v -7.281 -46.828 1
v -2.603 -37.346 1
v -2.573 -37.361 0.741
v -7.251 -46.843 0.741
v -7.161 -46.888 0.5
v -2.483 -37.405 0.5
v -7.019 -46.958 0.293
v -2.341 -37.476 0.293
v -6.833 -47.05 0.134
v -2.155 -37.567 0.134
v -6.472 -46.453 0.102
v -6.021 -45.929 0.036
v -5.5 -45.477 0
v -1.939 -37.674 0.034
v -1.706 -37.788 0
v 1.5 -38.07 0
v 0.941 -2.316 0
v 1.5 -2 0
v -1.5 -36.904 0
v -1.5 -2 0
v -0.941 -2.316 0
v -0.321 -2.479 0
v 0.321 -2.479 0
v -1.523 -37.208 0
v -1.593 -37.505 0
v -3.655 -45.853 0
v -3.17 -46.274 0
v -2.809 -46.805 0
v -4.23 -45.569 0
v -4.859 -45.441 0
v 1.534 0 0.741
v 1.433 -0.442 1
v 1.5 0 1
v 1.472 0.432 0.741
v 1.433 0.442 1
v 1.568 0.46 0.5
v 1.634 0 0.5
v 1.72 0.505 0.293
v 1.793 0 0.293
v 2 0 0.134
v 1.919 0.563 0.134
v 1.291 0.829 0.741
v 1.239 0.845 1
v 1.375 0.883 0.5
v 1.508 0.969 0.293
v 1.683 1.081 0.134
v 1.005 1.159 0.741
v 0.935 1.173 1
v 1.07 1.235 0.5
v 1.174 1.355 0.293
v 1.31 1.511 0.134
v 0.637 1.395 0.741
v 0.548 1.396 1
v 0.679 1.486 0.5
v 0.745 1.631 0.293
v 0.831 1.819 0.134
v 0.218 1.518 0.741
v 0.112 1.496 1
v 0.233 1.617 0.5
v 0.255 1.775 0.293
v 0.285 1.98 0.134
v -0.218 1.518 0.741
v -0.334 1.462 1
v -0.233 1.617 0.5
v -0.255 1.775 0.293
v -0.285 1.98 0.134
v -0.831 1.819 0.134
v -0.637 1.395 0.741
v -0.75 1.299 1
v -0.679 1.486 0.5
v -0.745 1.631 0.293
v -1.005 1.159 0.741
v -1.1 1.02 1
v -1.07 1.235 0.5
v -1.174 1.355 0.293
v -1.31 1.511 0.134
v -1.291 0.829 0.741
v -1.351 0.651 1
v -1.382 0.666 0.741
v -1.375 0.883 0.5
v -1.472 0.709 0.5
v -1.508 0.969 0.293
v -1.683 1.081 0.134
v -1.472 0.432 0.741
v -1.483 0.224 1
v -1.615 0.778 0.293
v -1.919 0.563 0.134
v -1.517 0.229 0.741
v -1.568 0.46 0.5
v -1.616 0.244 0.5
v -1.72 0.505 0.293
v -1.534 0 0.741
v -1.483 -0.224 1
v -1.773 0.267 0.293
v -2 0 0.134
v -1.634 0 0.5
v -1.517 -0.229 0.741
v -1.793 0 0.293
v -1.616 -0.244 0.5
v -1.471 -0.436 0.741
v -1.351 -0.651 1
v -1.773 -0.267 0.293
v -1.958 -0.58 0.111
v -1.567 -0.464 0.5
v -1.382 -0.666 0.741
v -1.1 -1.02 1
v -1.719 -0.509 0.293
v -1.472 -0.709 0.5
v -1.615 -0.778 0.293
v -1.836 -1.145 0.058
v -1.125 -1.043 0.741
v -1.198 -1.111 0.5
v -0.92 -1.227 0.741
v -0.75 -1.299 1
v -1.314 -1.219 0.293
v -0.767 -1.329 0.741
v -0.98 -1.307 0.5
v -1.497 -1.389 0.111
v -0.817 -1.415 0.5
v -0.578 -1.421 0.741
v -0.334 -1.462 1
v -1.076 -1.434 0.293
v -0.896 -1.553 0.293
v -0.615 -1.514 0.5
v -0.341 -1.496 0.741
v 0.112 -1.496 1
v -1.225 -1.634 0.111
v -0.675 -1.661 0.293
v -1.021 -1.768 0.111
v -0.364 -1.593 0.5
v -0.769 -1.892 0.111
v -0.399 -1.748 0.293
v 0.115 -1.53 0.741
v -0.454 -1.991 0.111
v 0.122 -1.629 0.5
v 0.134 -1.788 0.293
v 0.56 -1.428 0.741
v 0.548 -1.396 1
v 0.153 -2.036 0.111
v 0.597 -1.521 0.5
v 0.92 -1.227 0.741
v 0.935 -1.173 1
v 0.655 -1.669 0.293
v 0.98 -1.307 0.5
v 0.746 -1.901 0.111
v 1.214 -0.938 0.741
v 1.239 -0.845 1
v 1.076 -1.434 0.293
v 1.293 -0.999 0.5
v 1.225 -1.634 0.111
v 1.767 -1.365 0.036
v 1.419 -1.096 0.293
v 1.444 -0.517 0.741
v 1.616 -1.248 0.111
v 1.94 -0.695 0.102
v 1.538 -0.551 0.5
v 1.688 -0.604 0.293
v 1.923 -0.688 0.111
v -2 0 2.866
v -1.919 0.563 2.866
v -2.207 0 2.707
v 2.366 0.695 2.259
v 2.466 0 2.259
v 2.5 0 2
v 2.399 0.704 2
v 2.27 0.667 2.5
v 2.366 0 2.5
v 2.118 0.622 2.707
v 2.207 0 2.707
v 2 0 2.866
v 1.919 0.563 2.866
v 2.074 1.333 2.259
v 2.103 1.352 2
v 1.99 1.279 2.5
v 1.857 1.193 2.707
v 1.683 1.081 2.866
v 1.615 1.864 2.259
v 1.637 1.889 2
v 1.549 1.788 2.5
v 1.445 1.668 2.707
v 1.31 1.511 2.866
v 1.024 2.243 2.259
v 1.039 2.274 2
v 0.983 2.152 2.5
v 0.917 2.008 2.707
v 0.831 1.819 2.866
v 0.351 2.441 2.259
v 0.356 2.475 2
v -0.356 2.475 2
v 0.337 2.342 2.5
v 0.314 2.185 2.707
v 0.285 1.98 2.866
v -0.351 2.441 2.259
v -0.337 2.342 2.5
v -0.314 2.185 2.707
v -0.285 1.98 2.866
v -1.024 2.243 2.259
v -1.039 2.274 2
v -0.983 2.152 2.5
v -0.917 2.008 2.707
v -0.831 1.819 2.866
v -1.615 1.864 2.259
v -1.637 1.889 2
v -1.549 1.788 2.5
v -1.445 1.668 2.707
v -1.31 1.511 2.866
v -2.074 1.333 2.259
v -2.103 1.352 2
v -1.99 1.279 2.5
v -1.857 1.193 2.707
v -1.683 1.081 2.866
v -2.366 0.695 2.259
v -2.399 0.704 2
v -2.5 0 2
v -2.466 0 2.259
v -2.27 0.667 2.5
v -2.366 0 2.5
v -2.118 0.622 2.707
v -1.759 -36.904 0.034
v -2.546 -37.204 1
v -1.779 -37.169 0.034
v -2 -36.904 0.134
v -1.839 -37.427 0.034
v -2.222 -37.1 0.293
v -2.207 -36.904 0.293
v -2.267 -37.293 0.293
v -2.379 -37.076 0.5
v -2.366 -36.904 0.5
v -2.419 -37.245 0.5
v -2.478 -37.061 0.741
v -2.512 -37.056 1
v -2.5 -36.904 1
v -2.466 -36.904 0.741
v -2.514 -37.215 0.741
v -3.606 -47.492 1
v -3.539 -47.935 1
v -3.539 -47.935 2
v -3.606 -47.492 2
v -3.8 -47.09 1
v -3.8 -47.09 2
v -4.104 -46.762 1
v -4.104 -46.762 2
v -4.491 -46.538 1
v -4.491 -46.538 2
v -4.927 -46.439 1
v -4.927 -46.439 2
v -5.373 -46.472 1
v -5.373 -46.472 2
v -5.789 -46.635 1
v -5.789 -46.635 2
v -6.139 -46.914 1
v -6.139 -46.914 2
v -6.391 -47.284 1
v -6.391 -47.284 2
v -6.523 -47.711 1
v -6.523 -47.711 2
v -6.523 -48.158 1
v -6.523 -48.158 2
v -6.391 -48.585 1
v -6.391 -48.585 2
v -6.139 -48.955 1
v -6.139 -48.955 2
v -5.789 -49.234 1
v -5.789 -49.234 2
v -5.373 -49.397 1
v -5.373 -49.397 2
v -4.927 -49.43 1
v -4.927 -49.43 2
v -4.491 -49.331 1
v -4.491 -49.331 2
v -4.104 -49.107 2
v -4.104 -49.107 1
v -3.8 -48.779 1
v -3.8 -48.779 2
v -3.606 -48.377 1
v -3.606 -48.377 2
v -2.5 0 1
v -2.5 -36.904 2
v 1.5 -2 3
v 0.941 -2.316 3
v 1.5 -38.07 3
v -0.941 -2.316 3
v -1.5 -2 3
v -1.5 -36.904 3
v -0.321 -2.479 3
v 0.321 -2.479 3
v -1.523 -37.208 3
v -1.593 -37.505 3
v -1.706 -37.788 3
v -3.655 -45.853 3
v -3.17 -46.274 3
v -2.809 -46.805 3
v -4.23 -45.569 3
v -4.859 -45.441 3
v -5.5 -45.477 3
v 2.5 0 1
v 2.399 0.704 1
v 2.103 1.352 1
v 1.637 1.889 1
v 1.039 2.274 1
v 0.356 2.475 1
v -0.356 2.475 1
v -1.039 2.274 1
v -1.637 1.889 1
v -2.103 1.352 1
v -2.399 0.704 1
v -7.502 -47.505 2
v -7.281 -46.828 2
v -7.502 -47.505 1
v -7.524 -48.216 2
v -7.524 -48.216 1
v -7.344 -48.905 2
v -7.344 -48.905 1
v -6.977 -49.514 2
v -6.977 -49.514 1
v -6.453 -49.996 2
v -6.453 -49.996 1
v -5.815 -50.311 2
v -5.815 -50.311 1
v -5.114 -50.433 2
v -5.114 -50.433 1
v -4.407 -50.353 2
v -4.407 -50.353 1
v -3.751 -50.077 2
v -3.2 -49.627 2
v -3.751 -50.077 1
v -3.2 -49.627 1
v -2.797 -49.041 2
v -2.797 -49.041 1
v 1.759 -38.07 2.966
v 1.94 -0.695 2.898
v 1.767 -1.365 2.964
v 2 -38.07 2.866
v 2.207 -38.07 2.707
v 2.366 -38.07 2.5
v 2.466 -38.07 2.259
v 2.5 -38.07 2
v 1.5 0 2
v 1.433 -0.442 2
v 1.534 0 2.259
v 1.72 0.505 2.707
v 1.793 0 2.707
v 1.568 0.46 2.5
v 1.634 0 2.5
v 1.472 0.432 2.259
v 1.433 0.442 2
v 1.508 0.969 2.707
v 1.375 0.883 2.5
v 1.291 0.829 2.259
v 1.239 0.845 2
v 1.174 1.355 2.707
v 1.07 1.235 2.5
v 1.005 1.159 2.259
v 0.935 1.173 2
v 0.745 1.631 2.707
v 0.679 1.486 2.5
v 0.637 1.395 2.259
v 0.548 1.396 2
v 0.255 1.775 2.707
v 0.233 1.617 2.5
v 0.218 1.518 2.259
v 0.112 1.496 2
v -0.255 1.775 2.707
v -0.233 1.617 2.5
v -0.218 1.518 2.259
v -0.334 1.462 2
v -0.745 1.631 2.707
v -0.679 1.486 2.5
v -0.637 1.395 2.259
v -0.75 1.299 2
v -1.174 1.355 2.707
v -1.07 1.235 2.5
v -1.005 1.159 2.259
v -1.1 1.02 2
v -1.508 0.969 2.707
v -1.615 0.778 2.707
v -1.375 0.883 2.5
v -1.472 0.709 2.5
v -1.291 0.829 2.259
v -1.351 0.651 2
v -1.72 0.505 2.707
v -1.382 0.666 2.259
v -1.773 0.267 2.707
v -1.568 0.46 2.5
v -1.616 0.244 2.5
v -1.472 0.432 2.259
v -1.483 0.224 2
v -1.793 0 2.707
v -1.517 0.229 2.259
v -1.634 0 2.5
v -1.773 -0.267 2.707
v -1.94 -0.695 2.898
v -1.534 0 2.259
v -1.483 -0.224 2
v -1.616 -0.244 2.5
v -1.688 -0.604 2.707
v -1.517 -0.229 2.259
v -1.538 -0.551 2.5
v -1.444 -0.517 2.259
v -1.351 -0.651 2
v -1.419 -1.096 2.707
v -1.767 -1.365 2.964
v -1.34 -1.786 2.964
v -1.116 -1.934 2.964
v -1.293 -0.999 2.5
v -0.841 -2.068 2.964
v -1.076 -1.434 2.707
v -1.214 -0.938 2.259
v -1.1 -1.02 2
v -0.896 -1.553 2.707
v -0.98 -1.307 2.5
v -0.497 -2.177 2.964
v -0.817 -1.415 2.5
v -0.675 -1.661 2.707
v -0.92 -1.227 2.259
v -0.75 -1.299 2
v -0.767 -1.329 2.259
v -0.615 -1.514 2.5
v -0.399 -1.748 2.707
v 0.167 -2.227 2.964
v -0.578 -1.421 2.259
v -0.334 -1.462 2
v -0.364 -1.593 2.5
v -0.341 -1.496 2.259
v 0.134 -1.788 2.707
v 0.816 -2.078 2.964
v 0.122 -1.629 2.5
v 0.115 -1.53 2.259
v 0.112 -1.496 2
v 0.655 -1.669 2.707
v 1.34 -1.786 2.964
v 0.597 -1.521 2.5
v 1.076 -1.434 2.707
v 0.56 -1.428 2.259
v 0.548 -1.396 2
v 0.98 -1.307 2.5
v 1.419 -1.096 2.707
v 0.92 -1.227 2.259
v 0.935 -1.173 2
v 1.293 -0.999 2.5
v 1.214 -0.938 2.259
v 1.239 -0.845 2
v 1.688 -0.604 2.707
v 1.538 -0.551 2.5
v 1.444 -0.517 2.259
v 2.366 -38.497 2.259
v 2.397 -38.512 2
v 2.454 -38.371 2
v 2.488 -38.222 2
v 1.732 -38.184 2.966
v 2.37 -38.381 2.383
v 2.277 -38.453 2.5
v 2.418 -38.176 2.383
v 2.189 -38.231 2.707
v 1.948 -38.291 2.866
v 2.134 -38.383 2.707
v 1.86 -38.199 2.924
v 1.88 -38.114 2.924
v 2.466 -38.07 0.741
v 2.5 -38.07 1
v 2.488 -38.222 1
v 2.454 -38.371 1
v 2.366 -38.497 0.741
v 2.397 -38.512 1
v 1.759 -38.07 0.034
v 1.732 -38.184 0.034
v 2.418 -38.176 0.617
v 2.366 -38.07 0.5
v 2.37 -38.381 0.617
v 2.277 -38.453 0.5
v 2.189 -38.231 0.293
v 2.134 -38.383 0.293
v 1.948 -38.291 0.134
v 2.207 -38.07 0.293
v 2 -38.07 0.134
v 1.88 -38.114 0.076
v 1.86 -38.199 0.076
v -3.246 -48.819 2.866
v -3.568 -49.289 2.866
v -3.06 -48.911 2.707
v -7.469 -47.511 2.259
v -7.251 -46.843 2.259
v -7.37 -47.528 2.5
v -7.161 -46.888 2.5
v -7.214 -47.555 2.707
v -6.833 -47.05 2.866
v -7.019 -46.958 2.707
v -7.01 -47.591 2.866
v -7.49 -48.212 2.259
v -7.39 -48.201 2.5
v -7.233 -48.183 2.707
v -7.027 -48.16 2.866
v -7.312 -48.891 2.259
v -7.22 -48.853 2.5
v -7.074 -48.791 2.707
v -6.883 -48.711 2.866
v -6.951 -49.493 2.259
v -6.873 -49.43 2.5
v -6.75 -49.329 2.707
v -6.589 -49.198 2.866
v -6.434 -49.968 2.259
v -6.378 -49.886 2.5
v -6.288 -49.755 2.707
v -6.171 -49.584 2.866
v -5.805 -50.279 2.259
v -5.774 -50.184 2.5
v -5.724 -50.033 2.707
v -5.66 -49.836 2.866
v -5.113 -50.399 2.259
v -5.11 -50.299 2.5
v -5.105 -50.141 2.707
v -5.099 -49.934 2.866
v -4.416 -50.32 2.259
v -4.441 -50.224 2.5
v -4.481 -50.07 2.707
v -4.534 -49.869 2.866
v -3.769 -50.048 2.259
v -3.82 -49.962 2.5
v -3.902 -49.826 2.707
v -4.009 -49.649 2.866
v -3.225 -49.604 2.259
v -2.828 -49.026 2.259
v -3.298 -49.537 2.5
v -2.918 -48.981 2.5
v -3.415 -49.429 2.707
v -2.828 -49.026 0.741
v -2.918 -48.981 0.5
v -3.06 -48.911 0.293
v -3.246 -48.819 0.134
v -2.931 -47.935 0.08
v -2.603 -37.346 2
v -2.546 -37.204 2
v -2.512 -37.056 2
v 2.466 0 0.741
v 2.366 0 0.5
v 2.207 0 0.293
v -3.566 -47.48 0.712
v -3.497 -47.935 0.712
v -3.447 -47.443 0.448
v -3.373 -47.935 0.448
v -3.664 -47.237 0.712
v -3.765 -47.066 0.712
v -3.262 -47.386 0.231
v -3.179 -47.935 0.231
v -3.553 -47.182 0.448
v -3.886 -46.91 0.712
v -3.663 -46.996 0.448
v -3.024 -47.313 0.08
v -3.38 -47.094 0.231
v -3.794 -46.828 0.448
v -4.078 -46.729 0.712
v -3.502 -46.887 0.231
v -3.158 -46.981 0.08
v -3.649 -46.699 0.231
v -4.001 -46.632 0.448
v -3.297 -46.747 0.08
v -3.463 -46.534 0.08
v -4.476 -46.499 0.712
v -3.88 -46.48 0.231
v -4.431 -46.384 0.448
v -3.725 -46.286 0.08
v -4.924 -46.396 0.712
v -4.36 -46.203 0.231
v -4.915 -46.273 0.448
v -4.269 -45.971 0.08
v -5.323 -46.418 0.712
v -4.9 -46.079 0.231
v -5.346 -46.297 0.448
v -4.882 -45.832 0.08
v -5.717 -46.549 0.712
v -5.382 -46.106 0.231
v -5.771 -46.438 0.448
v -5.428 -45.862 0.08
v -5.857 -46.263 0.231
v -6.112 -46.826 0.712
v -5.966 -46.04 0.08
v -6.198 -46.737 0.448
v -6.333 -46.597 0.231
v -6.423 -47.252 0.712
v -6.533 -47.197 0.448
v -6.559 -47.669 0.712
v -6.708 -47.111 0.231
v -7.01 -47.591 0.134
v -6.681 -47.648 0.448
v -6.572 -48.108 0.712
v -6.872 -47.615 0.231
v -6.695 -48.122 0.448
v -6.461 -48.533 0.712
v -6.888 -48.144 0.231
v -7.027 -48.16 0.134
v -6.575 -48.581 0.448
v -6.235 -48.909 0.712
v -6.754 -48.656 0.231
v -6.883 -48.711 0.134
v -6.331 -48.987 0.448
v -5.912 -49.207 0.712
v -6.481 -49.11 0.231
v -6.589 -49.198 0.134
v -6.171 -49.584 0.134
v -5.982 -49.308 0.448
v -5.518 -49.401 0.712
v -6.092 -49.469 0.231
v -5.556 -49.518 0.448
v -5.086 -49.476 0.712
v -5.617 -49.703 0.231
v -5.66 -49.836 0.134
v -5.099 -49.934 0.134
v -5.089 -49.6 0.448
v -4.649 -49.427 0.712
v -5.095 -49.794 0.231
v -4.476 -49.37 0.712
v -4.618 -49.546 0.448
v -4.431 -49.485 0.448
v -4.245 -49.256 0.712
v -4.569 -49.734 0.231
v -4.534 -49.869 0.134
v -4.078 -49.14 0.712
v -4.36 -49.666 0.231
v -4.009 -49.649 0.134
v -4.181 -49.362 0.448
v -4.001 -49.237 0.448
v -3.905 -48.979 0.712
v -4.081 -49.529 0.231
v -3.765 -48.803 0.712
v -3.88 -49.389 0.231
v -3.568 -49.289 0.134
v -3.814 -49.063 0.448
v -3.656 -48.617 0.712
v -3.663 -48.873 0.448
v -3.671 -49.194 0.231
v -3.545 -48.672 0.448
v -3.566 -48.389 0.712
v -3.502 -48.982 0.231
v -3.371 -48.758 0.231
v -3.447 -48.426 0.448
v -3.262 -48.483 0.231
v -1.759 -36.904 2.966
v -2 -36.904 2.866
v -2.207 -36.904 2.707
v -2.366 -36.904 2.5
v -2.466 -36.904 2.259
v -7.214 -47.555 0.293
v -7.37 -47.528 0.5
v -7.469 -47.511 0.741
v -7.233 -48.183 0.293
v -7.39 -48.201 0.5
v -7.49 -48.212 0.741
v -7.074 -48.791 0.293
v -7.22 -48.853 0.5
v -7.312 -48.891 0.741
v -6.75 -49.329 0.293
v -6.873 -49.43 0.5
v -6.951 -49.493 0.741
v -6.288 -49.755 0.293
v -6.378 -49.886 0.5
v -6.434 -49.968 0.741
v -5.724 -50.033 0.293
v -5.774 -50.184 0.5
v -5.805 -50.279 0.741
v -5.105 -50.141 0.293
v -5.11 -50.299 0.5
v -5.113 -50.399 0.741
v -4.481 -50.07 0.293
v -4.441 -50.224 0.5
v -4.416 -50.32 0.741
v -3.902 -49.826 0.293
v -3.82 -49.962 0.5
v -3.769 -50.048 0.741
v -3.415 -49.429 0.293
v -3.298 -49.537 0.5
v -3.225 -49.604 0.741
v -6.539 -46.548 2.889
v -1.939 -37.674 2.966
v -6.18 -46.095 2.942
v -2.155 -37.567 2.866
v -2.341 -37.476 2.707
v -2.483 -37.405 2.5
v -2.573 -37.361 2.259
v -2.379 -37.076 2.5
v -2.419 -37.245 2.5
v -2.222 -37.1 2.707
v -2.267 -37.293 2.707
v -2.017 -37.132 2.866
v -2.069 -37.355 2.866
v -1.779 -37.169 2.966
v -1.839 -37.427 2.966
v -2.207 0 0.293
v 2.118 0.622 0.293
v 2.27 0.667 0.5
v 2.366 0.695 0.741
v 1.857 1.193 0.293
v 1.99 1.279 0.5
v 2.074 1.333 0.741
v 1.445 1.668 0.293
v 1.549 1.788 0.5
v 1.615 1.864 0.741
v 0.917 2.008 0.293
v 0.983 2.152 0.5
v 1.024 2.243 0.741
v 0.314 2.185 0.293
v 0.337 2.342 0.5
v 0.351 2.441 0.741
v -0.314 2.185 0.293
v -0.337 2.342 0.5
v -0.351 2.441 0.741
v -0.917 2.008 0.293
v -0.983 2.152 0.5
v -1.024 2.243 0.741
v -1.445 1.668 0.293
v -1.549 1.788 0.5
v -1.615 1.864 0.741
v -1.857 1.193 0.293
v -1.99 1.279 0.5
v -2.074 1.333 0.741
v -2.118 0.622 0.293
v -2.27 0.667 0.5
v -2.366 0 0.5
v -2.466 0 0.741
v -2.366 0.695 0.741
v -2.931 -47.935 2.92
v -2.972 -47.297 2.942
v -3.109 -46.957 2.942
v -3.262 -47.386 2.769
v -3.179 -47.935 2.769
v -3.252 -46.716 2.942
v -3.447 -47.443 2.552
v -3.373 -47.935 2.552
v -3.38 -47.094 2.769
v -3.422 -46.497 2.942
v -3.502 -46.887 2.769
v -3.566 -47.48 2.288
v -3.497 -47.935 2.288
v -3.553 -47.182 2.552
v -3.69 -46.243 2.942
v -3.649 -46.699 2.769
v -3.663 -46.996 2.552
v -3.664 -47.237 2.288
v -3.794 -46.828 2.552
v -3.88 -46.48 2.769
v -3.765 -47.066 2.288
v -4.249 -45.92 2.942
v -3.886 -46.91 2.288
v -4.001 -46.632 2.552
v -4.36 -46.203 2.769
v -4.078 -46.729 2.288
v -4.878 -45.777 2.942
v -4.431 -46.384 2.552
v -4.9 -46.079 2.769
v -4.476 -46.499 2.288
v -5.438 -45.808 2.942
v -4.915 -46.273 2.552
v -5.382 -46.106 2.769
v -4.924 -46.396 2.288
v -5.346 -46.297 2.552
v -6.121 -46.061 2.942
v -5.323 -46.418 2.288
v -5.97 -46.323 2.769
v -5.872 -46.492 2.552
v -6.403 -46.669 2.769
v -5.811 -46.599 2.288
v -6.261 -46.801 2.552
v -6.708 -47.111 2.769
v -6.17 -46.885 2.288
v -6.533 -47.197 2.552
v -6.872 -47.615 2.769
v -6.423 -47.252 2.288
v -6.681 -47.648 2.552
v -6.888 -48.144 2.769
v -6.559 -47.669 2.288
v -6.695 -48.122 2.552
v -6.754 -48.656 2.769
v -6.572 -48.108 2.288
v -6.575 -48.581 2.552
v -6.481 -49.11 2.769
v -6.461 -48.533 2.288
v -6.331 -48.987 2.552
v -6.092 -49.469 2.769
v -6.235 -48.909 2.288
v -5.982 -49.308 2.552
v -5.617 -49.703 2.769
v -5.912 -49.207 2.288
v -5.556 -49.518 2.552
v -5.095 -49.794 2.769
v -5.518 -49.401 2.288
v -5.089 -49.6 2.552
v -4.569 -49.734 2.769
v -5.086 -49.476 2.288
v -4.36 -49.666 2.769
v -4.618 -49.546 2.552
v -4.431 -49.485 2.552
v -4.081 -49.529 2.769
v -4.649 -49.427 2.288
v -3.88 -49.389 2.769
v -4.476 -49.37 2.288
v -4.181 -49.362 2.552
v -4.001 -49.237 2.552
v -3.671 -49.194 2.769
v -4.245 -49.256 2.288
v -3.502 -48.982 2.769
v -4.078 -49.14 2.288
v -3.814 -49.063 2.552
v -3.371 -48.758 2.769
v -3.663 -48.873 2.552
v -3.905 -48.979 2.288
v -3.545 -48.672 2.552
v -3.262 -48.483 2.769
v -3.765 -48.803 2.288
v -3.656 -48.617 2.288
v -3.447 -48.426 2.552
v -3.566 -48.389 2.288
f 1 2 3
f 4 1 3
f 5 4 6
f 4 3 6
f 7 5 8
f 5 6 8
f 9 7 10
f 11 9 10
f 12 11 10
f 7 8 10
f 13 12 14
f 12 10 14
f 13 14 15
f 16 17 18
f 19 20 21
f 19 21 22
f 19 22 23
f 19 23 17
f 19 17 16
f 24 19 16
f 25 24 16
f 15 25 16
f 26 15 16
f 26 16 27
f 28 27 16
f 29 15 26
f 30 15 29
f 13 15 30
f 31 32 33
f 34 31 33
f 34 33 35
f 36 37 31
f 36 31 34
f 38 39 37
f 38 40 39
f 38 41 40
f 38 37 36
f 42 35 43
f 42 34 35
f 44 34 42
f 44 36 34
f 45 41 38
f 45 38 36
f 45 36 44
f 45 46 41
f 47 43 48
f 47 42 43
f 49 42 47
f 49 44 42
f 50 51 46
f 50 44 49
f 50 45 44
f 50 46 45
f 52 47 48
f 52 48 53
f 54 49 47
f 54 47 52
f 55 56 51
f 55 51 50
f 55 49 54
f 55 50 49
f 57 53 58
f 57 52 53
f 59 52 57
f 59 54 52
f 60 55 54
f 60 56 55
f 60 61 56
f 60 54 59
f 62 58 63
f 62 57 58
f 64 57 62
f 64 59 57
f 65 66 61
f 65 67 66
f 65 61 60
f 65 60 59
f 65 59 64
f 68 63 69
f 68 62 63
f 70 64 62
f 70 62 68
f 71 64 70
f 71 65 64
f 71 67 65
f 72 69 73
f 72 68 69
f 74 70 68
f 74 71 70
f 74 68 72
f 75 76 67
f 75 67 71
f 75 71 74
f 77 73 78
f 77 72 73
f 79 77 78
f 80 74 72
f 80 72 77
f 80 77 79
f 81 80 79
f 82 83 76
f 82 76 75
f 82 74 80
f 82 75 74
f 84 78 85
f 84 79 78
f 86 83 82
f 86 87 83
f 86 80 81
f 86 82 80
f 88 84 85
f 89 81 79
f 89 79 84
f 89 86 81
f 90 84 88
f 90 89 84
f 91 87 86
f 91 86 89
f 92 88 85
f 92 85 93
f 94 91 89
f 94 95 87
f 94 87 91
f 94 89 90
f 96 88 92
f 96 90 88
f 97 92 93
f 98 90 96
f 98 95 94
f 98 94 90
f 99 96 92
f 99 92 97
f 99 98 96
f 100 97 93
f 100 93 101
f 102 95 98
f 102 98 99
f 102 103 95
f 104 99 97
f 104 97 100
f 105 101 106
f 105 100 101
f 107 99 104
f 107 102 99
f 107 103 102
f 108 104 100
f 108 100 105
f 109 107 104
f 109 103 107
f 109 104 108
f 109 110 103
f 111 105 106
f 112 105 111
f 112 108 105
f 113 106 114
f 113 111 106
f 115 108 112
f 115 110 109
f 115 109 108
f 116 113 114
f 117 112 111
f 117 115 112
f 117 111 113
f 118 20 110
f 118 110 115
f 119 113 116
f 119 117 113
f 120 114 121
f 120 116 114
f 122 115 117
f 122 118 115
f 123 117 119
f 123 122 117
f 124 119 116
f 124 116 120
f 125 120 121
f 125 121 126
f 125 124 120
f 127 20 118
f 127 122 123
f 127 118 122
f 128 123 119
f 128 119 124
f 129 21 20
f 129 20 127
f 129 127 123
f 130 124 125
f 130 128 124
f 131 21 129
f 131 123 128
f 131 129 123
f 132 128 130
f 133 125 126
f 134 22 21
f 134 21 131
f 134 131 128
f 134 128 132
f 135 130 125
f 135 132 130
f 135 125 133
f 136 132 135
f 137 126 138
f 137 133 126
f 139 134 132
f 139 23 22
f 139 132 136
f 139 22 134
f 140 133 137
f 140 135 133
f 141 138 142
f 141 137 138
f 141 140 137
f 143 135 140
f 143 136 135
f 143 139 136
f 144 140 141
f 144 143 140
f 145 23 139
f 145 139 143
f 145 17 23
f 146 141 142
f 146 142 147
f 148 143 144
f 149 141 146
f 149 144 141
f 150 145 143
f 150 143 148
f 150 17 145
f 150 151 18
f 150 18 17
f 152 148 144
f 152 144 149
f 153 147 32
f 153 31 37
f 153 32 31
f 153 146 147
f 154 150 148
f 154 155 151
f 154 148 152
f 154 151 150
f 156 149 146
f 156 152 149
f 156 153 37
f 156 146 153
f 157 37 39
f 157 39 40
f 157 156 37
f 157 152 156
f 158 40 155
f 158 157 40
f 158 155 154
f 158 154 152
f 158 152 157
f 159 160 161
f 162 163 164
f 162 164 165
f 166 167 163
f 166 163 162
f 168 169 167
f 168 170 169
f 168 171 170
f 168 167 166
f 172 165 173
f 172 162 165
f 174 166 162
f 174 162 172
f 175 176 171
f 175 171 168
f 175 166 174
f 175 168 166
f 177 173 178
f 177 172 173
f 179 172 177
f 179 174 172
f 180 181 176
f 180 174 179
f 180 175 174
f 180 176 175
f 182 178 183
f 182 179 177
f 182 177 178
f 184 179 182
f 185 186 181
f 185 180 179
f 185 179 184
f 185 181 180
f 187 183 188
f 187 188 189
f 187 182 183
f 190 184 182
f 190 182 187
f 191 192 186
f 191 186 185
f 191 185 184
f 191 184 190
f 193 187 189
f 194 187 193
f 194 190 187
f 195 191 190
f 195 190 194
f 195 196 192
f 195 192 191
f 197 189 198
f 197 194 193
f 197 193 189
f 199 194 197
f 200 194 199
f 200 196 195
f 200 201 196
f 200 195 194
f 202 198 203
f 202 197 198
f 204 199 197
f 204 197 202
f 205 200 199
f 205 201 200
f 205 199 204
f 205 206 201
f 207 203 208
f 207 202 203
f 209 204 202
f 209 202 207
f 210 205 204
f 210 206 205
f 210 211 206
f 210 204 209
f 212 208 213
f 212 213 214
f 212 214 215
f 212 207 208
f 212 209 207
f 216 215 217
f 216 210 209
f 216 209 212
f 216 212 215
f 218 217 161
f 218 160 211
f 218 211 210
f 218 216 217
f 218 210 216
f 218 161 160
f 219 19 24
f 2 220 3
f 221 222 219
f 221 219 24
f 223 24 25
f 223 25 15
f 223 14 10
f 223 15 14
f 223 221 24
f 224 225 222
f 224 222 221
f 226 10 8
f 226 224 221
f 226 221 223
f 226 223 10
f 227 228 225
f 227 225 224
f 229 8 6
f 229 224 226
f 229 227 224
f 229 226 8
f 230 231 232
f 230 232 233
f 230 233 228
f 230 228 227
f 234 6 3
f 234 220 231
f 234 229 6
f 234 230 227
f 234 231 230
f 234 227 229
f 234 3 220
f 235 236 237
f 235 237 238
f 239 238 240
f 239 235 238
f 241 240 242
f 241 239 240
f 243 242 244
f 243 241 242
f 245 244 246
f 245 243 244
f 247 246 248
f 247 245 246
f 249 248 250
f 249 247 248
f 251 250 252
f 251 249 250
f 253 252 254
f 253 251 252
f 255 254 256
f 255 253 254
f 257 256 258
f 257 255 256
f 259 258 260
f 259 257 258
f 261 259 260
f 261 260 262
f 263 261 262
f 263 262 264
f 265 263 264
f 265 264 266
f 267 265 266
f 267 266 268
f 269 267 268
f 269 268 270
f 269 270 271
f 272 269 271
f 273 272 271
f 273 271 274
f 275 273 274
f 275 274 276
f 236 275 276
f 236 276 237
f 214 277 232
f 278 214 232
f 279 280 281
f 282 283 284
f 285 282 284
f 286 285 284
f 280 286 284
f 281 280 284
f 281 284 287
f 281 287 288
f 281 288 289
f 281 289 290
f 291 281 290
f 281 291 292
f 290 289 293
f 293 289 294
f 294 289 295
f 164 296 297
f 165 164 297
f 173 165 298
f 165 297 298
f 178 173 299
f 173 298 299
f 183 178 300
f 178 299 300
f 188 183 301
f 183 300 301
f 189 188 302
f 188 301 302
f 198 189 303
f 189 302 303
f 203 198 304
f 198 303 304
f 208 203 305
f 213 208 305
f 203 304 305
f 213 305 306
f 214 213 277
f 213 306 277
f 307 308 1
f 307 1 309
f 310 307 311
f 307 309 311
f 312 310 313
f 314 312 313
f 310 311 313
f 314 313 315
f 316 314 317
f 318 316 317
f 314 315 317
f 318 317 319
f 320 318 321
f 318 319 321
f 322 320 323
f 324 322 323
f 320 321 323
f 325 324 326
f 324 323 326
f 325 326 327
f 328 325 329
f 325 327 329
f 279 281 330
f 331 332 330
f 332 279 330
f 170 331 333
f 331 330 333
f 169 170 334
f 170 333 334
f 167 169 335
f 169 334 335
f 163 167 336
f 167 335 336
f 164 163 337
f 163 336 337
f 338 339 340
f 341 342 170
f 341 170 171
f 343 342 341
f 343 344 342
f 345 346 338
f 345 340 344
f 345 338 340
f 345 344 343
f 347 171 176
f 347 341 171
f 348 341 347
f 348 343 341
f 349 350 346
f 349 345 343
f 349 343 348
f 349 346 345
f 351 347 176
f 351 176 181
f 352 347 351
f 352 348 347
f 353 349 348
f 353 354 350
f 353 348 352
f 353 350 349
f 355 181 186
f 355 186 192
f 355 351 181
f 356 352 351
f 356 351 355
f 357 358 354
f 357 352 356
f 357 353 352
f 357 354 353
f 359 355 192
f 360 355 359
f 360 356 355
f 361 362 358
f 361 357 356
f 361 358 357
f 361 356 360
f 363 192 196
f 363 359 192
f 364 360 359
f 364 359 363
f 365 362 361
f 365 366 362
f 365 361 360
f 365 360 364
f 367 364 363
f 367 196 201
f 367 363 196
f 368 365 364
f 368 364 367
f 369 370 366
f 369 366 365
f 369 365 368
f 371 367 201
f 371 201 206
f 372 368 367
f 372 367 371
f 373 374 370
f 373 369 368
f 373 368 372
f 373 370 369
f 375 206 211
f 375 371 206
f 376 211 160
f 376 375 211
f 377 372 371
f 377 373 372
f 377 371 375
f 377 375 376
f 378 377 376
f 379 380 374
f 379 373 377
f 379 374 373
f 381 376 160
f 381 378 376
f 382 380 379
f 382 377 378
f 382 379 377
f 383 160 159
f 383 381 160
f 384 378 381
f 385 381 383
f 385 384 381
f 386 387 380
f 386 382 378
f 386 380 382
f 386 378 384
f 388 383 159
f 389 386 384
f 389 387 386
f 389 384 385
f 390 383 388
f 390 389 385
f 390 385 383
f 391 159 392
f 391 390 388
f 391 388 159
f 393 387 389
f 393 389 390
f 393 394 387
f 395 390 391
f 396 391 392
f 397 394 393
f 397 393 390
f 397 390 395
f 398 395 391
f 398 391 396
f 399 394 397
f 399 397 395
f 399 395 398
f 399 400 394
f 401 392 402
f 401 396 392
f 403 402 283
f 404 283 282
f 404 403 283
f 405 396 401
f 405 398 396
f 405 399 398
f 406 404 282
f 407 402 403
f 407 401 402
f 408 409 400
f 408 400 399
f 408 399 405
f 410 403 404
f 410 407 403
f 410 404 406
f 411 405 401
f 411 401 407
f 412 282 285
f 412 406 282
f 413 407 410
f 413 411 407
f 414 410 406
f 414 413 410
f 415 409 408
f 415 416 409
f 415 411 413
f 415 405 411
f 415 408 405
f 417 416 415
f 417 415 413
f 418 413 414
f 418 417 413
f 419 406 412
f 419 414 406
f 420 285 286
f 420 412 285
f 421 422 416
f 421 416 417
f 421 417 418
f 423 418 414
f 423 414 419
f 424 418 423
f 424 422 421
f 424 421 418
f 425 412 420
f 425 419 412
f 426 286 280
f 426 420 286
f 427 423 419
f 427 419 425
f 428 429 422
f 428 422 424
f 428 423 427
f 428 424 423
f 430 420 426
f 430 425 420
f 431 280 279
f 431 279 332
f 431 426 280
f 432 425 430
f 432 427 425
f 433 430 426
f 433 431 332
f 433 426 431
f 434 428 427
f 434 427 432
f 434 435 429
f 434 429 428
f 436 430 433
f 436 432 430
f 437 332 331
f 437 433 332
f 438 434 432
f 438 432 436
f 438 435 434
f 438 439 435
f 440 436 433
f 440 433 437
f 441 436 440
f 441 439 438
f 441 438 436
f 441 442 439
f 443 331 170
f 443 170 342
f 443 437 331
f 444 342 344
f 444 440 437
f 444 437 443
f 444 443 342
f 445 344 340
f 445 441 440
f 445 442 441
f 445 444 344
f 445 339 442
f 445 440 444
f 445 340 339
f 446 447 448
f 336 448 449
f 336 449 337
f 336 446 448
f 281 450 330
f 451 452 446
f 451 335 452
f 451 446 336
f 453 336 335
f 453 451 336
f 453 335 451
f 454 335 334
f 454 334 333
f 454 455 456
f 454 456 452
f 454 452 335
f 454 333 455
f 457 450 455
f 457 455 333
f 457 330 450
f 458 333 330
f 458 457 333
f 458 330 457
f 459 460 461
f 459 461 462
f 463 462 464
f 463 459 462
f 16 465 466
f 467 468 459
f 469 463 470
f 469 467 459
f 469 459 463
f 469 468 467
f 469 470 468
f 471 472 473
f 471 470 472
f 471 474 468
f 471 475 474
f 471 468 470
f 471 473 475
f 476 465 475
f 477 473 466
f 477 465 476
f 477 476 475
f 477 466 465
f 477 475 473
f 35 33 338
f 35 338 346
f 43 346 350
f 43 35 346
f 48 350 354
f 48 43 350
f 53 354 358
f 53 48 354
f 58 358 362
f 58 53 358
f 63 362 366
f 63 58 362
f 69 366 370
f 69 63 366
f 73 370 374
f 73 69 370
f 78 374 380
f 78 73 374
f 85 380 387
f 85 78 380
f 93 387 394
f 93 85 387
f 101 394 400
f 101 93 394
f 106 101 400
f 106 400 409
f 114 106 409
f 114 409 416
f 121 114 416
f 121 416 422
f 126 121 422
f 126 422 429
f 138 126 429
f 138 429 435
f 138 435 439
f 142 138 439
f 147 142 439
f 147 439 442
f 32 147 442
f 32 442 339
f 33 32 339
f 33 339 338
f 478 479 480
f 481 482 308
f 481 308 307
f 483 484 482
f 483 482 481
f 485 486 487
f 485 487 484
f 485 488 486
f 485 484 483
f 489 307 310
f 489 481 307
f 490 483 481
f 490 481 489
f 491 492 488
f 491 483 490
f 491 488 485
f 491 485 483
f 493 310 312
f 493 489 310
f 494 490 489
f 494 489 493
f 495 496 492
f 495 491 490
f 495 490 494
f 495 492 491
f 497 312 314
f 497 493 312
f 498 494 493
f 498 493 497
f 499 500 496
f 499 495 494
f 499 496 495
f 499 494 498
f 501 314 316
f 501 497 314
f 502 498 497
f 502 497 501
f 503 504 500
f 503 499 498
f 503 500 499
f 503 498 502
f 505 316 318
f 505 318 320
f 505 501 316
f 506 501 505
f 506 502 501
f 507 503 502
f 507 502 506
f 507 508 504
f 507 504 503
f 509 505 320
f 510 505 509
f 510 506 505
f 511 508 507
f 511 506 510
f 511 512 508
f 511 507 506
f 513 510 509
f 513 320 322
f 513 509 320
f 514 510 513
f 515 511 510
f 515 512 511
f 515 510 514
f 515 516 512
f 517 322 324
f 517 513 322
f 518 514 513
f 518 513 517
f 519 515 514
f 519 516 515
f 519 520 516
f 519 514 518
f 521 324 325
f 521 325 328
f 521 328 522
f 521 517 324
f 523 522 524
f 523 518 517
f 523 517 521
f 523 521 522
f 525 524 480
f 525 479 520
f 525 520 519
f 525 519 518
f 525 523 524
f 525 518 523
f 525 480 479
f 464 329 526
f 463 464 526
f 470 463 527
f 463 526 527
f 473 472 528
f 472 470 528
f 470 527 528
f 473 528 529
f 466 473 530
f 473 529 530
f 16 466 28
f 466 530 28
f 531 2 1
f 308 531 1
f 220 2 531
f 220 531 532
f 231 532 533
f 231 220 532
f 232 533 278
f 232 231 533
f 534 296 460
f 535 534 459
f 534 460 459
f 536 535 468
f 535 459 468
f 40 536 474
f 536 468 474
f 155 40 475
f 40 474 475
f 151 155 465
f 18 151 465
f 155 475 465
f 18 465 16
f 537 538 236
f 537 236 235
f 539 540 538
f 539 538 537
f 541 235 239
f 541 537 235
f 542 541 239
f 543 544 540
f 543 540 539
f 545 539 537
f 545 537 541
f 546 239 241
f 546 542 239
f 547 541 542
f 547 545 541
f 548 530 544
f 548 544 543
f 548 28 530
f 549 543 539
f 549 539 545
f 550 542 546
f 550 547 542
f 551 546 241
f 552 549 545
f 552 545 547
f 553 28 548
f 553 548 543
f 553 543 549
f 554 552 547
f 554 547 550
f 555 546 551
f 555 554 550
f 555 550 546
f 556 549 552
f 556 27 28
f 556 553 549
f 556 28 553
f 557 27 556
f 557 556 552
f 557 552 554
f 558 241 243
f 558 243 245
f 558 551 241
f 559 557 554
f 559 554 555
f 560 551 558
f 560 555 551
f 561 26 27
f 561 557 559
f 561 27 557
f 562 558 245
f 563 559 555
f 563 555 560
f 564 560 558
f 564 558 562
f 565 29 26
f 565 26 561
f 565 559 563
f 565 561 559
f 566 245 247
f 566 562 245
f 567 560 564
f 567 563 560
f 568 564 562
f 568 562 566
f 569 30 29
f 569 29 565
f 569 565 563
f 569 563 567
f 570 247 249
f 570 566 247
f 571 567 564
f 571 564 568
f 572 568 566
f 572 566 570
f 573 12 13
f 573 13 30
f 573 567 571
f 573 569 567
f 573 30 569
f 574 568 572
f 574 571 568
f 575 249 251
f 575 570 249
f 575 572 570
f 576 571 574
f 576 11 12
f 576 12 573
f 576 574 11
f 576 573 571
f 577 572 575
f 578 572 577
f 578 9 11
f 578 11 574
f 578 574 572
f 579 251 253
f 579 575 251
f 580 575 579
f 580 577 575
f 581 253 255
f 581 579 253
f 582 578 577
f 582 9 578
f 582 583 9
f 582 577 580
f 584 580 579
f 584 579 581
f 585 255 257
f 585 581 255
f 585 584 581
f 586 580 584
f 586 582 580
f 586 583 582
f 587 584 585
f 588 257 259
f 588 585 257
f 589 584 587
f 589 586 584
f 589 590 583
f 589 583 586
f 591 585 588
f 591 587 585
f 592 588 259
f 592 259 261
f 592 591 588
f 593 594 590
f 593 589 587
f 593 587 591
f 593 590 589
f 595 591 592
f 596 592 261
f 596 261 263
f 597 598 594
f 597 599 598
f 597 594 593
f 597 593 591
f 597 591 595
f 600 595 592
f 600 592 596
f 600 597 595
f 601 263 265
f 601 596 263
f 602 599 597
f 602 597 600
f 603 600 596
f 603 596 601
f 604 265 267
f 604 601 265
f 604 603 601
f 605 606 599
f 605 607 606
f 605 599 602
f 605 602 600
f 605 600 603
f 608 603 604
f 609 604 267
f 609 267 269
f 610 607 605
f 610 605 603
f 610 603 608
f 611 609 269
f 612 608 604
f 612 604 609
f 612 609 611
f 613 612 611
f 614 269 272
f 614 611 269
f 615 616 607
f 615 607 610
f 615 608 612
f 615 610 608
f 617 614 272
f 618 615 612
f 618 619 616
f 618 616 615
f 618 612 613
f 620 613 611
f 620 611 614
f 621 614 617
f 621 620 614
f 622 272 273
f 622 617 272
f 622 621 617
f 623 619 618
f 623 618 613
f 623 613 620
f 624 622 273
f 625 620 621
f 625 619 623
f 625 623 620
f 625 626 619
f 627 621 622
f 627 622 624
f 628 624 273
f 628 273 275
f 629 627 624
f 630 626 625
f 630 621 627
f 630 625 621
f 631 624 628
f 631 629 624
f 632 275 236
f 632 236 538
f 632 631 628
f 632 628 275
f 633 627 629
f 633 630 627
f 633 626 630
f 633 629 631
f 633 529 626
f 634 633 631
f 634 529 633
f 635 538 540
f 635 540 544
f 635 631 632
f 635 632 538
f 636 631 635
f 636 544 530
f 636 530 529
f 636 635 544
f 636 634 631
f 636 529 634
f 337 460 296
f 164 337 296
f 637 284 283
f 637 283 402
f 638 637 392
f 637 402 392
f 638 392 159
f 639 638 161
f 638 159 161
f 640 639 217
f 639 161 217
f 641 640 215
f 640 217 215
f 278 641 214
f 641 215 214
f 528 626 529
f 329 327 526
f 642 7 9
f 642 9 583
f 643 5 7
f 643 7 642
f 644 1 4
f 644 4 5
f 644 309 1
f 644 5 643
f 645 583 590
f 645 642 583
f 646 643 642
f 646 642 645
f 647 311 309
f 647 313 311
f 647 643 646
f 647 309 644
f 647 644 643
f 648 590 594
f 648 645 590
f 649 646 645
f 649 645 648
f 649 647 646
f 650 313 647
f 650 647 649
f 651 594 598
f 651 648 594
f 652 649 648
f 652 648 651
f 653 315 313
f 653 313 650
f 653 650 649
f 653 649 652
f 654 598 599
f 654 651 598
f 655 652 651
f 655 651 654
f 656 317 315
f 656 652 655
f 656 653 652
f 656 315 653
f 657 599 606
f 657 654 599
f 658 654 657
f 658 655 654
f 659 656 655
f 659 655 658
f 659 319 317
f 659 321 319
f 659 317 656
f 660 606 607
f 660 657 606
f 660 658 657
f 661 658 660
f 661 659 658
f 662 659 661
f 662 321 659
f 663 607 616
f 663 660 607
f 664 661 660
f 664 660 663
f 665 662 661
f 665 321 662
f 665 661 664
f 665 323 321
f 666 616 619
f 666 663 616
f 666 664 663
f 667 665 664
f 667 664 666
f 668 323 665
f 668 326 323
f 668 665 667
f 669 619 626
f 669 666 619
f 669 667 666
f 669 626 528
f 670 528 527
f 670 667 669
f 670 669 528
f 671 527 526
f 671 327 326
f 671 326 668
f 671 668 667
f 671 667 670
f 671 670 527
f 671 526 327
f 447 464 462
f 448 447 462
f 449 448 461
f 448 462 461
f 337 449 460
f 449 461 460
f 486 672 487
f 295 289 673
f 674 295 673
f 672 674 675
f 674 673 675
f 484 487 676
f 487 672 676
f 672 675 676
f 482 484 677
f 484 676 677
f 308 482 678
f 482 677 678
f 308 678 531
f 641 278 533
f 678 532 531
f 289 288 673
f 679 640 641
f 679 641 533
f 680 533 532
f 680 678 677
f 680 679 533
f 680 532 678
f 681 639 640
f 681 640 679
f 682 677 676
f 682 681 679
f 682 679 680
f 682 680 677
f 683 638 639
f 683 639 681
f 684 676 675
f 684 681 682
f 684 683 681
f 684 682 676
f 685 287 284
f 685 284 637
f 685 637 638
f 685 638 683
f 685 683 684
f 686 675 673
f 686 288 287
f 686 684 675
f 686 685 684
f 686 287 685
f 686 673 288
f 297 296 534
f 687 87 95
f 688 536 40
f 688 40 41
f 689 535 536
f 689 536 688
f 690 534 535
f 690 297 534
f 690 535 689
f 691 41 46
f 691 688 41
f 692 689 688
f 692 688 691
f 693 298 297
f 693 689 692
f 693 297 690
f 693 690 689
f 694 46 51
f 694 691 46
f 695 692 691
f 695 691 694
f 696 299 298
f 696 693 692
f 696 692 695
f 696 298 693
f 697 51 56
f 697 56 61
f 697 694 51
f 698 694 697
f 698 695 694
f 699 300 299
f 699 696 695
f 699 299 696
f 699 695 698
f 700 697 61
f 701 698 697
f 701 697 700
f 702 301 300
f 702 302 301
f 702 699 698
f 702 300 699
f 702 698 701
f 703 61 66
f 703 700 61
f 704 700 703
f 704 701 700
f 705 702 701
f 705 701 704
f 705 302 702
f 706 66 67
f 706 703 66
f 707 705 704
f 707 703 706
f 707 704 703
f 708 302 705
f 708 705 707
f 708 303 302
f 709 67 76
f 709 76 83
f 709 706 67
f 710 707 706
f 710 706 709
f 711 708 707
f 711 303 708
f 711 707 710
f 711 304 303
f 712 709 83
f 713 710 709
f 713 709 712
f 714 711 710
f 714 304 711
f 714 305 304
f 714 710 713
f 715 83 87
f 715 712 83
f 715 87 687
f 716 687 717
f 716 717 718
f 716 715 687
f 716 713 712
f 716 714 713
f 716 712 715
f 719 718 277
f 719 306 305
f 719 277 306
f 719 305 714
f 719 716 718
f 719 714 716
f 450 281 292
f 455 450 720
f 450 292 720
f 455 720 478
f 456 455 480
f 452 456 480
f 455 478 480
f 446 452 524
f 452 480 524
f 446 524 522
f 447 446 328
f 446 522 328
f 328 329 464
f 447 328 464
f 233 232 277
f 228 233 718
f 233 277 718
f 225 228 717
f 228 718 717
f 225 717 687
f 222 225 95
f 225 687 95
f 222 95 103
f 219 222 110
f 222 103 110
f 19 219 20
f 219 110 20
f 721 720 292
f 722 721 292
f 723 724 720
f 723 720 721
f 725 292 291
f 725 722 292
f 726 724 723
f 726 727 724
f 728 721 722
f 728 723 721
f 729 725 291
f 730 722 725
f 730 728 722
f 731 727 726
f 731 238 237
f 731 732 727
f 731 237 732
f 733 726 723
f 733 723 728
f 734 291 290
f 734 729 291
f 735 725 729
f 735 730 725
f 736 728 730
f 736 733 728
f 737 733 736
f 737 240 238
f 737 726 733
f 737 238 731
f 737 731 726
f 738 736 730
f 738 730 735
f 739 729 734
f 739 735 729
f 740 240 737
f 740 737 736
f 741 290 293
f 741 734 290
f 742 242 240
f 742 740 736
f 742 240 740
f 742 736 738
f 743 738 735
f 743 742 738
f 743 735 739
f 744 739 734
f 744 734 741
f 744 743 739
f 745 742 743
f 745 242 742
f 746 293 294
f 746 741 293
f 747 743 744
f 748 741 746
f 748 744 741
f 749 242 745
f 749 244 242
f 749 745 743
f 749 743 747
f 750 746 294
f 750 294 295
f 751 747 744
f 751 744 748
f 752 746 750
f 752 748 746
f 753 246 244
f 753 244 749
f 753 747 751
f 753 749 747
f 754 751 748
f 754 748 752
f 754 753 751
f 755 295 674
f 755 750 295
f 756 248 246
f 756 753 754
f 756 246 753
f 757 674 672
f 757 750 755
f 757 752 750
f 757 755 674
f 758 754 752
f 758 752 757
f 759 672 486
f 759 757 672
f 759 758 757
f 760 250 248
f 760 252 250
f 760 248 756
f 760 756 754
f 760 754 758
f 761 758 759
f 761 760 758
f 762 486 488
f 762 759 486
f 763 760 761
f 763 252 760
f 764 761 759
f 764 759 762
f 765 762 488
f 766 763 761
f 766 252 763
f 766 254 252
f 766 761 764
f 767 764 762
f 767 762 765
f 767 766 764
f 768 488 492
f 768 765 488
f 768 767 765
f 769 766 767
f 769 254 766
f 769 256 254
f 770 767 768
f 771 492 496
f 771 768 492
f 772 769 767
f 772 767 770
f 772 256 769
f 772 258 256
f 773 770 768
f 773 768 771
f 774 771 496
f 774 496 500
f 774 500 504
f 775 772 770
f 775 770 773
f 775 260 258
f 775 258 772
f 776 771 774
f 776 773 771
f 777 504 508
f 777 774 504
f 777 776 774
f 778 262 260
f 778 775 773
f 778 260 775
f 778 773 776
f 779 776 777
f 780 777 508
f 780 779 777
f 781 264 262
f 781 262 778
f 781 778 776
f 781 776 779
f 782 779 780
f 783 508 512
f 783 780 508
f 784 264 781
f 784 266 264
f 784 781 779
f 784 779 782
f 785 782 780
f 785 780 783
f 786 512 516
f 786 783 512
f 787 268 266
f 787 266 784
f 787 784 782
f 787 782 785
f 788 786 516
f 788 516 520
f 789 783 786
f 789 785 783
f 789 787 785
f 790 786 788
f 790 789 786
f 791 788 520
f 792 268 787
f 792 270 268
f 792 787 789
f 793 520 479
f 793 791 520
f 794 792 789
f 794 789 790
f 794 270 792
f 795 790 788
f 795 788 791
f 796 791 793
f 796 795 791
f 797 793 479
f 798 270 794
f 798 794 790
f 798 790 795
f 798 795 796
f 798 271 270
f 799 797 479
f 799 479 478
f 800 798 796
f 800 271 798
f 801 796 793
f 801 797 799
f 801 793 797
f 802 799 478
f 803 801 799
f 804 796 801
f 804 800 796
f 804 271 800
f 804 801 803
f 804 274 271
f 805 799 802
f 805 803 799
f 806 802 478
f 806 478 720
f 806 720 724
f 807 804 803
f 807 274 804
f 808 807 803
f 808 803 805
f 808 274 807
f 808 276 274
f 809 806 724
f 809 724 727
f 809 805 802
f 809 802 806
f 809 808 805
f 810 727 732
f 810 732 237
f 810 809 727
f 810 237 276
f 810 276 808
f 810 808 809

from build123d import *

# Parameters (mm, degrees)
SKETCH1_R           = 1.5
BOSS_EXTRUDE1_DEPTH = 3
FILLET1_R           = 1


with BuildPart() as part:
    # Sketch1 → Boss-Extrude1 (new body)
    with BuildSketch(Plane.XY):
        with BuildLine():
            Line((-2.5, 0), (-2.5, -37.136851725))
            Line((-2.5, -37.136851725), (-7.28143986, -46.828388088))
            ThreePointArc((-7.28143986, -46.828388088), (-6.145564068, -50.176489966), (-2.79746219, -49.040614175))
            Line((-2.79746219, -49.040614175), (2.5, -38.303148275))
            Line((2.5, -38.303148275), (2.5, 0))
            ThreePointArc((2.5, 0), (0, 2.5), (-2.5, 0))
        make_face()
        Circle(SKETCH1_R, mode=Mode.SUBTRACT)
        with Locations((-5.039451025, -47.934501132)):
            Circle(SKETCH1_R, mode=Mode.SUBTRACT)
    extrude(amount=BOSS_EXTRUDE1_DEPTH)

    # Fillet1
    # the kernel refuses this fillet: 1 mm, written as the material it adds along each edge
    with BuildSketch(Plane(origin=(-2.5, -37.136851725, 0), x_dir=(0, 1, 0), z_dir=(0, 0, 1))) as fillet1_piece_1:
        with BuildLine():
            CenterArc((FILLET1_R * 0.23325930992, FILLET1_R), FILLET1_R, 243.74, 26.26)
            Line((-FILLET1_R * 0.209185907385, FILLET1_R * 0.103204466066), (0, 0))
            Line((0, 0), (FILLET1_R * 0.23325930992, 0))
        make_face()
    extrude(amount=3)
    # the kernel refuses this fillet: 1 mm, written as the material it takes off along each edge
    with BuildSketch(Plane(origin=(1.5, -38.069888965, 2), x_dir=(0.8967955339340403, -0.44244521730487674, 0), z_dir=(0, 0, 1))) as fillet1_2_piece_1_section:
        Polygon((0, 0), (FILLET1_R, 0), (FILLET1_R, FILLET1_R * 0.23325930992), (FILLET1_R * 0.896795533934, FILLET1_R * 0.442445217305), align=None)
    fillet1_2_piece_1 = extrude(amount=FILLET1_R, mode=Mode.PRIVATE)
    fillet1_2_piece_1 = fillet1_2_piece_1 - Plane(origin=(1.5, -38.069888965, 2), x_dir=(-0.9738571594268947, 0.22716124896861223, 0), z_dir=(0, 0, 1)) * Sphere(FILLET1_R, mode=Mode.PRIVATE)
    add(fillet1_2_piece_1, mode=Mode.SUBTRACT)
    with BuildSketch(Plane(origin=(1.5, -38.069888965, 1), x_dir=(0.8967955339340403, -0.44244521730487674, 0), z_dir=(0, 0, -1))) as fillet1_2_piece_2_section:
        Polygon((0, 0), (FILLET1_R, 0), (FILLET1_R, -FILLET1_R * 0.23325930992), (FILLET1_R * 0.896795533934, -FILLET1_R * 0.442445217305), align=None)
    fillet1_2_piece_2 = extrude(amount=FILLET1_R, mode=Mode.PRIVATE)
    fillet1_2_piece_2 = fillet1_2_piece_2 - Plane(origin=(1.5, -38.069888965, 1), x_dir=(-0.9738571594268947, 0.22716124896861223, 0), z_dir=(0, 0, -1)) * Sphere(FILLET1_R, mode=Mode.PRIVATE)
    add(fillet1_2_piece_2, mode=Mode.SUBTRACT)
    with BuildSketch(Plane(origin=(0, 0, 3), x_dir=(1, 0, 0), z_dir=(0, -1, 0))) as fillet1_2_piece_3:
        with BuildLine():
            CenterArc((2.5 - FILLET1_R, -FILLET1_R), FILLET1_R, 0, 90)
            Line((2.5, -FILLET1_R), (2.5, 0))
            Line((2.5, 0), (2.5 - FILLET1_R, 0))
        make_face()
    revolve(axis=Axis((0, 0, 3), (0, 0, 1)), revolution_arc=180, mode=Mode.SUBTRACT)
    with BuildSketch(Plane(origin=(0, 0, 0), x_dir=(1, 0, 0), z_dir=(0, -1, 0))) as fillet1_2_piece_4:
        with BuildLine():
            CenterArc((2.5 - FILLET1_R, FILLET1_R), FILLET1_R, 270, 90)
            Line((2.5, FILLET1_R), (2.5, 0))
            Line((2.5, 0), (2.5 - FILLET1_R, 0))
        make_face()
    revolve(axis=Axis((0, 0, 0), (0, 0, 1)), revolution_arc=180, mode=Mode.SUBTRACT)
    with BuildSketch(Plane(origin=(-2.5, 0, 3), x_dir=(0, 0, -1), z_dir=(0, -1, 0))) as fillet1_2_piece_5:
        with BuildLine():
            CenterArc((FILLET1_R, FILLET1_R), FILLET1_R, 180, 90)
            Line((0, FILLET1_R), (0, 0))
            Line((0, 0), (FILLET1_R, 0))
        make_face()
    extrude(amount=36.903592415, mode=Mode.SUBTRACT)
    with BuildSketch(Plane(origin=(-2.5, 0, 0), x_dir=(0, 0, 1), z_dir=(0, -1, 0))) as fillet1_2_piece_6:
        with BuildLine():
            CenterArc((FILLET1_R, -FILLET1_R), FILLET1_R, 90, 90)
            Line((0, -FILLET1_R), (0, 0))
            Line((0, 0), (FILLET1_R, 0))
        make_face()
    extrude(amount=36.903592415, mode=Mode.SUBTRACT)
    with BuildSketch(Plane(origin=(-2.603204466, -37.346037633, 3), x_dir=(0.8967955339340403, -0.4424452173048767, 0), z_dir=(-0.4424452173048767, -0.8967955339340403, 0))) as fillet1_2_piece_7:
        with BuildLine():
            CenterArc((FILLET1_R, -FILLET1_R), FILLET1_R, 90, 90)
            Line((0, -FILLET1_R), (0, 0))
            Line((0, 0), (FILLET1_R, 0))
        make_face()
    extrude(amount=10.573592415, mode=Mode.SUBTRACT)
    with BuildSketch(Plane(origin=(-2.603204466, -37.346037633, 0), x_dir=(0.8967955339340403, -0.4424452173048767, 0), z_dir=(-0.4424452173048767, -0.8967955339340403, 0))) as fillet1_2_piece_8:
        with BuildLine():
            CenterArc((FILLET1_R, FILLET1_R), FILLET1_R, 180, 90)
            Line((0, FILLET1_R), (0, 0))
            Line((0, 0), (FILLET1_R, 0))
        make_face()
    extrude(amount=10.573592415, mode=Mode.SUBTRACT)
    with BuildSketch(Plane(origin=(-5.039451025, -47.934501132, 3), x_dir=(-0.8967955339340404, 0.44244521730487624, 0), z_dir=(0.44244521730487624, 0.8967955339340404, 0))) as fillet1_2_piece_9:
        with BuildLine():
            CenterArc((2.5 - FILLET1_R, -FILLET1_R), FILLET1_R, 0, 90)
            Line((2.5, -FILLET1_R), (2.5, 0))
            Line((2.5, 0), (2.5 - FILLET1_R, 0))
        make_face()
    revolve(axis=Axis((-5.039451025, -47.934501132, 3), (0, 0, 1)), revolution_arc=180, mode=Mode.SUBTRACT)
    with BuildSketch(Plane(origin=(-5.039451025, -47.934501132, 0), x_dir=(-0.8967955339340404, 0.44244521730487624, 0), z_dir=(0.44244521730487624, 0.8967955339340404, 0))) as fillet1_2_piece_10:
        with BuildLine():
            CenterArc((2.5 - FILLET1_R, FILLET1_R), FILLET1_R, 270, 90)
            Line((2.5, FILLET1_R), (2.5, 0))
            Line((2.5, 0), (2.5 - FILLET1_R, 0))
        make_face()
    revolve(axis=Axis((-5.039451025, -47.934501132, 0), (0, 0, 1)), revolution_arc=180, mode=Mode.SUBTRACT)
    with BuildSketch(Plane(origin=(-2.79746219, -49.040614175, 3), x_dir=(-0.8967955339340403, 0.44244521730487674, 0), z_dir=(0.44244521730487674, 0.8967955339340403, 0))) as fillet1_2_piece_11:
        with BuildLine():
            CenterArc((FILLET1_R, -FILLET1_R), FILLET1_R, 90, 90)
            Line((0, -FILLET1_R), (0, 0))
            Line((0, 0), (FILLET1_R, 0))
        make_face()
    extrude(amount=11.739888965, mode=Mode.SUBTRACT)
    with BuildSketch(Plane(origin=(-2.79746219, -49.040614175, 0), x_dir=(-0.8967955339340403, 0.44244521730487674, 0), z_dir=(0.44244521730487674, 0.8967955339340403, 0))) as fillet1_2_piece_12:
        with BuildLine():
            CenterArc((FILLET1_R, FILLET1_R), FILLET1_R, 180, 90)
            Line((0, FILLET1_R), (0, 0))
            Line((0, 0), (FILLET1_R, 0))
        make_face()
    extrude(amount=11.739888965, mode=Mode.SUBTRACT)
    with BuildSketch(Plane(origin=(2.5, -38.303148275, 1), x_dir=(-0.4424452173048793, -0.896795533934039, 0), z_dir=(0, 0, 1))) as fillet1_2_piece_13:
        with BuildLine():
            CenterArc((FILLET1_R * 0.23325930992, -FILLET1_R), FILLET1_R, 90, 26.26)
            Line((-FILLET1_R * 0.209185907385, -FILLET1_R * 0.103204466066), (0, 0))
            Line((0, 0), (FILLET1_R * 0.23325930992, 0))
        make_face()
    extrude(amount=1, mode=Mode.SUBTRACT)
    with BuildSketch(Plane(origin=(2.5, -38.069888965, 3), x_dir=(-1, 0, 0), z_dir=(0, 1, 0))) as fillet1_2_piece_14:
        with BuildLine():
            CenterArc((FILLET1_R, -FILLET1_R), FILLET1_R, 90, 90)
            Line((0, -FILLET1_R), (0, 0))
            Line((0, 0), (FILLET1_R, 0))
        make_face()
    extrude(amount=38.069888965, mode=Mode.SUBTRACT)
    with BuildSketch(Plane(origin=(2.5, -38.069888965, 0), x_dir=(-1, 0, 0), z_dir=(0, 1, 0))) as fillet1_2_piece_15:
        with BuildLine():
            CenterArc((FILLET1_R, FILLET1_R), FILLET1_R, 180, 90)
            Line((0, FILLET1_R), (0, 0))
            Line((0, 0), (FILLET1_R, 0))
        make_face()
    extrude(amount=38.069888965, mode=Mode.SUBTRACT)
    with BuildSketch(Plane(origin=(0, 0, 0), x_dir=(1, 0, 0), z_dir=(0, -1, 0))) as fillet1_2_piece_16:
        with BuildLine():
            CenterArc((1.5 + FILLET1_R, FILLET1_R), FILLET1_R, 180, 90)
            Line((1.5, FILLET1_R), (1.5, 0))
            Line((1.5, 0), (1.5 + FILLET1_R, 0))
        make_face()
    revolve(axis=Axis((0, 0, 0), (0, 0, 1)), mode=Mode.SUBTRACT)
    with BuildSketch(Plane(origin=(0, 0, 3), x_dir=(1, 0, 0), z_dir=(0, -1, 0))) as fillet1_2_piece_17:
        with BuildLine():
            CenterArc((1.5 + FILLET1_R, -FILLET1_R), FILLET1_R, 90, 90)
            Line((1.5, -FILLET1_R), (1.5, 0))
            Line((1.5, 0), (1.5 + FILLET1_R, 0))
        make_face()
    revolve(axis=Axis((0, 0, 3), (0, 0, 1)), mode=Mode.SUBTRACT)
    with BuildSketch(Plane(origin=(-5.039451025, -47.934501132, 0), x_dir=(1, 0, 0), z_dir=(0, -1, 0))) as fillet1_2_piece_18:
        with BuildLine():
            CenterArc((1.5 + FILLET1_R, FILLET1_R), FILLET1_R, 180, 90)
            Line((1.5, FILLET1_R), (1.5, 0))
            Line((1.5, 0), (1.5 + FILLET1_R, 0))
        make_face()
    revolve(axis=Axis((-5.039451025, -47.934501132, 0), (0, 0, 1)), mode=Mode.SUBTRACT)
    with BuildSketch(Plane(origin=(-5.039451025, -47.934501132, 3), x_dir=(1, 0, 0), z_dir=(0, -1, 0))) as fillet1_2_piece_19:
        with BuildLine():
            CenterArc((1.5 + FILLET1_R, -FILLET1_R), FILLET1_R, 90, 90)
            Line((1.5, -FILLET1_R), (1.5, 0))
            Line((1.5, 0), (1.5 + FILLET1_R, 0))
        make_face()
    revolve(axis=Axis((-5.039451025, -47.934501132, 3), (0, 0, 1)), mode=Mode.SUBTRACT)
    with BuildSketch(Plane(origin=(-3.5, -36.903592415, 0), x_dir=(1, 0, 0), z_dir=(0, 1, 0))) as fillet1_2_piece_20:
        with BuildLine():
            CenterArc((1 + FILLET1_R, -FILLET1_R), FILLET1_R, 90, 90)
            Line((1, -FILLET1_R), (1, 0))
            Line((1, 0), (1 + FILLET1_R, 0))
        make_face()
    revolve(axis=Axis((-3.5, -36.903592415, 0), (0, 0, -1)), revolution_arc=26.26, mode=Mode.SUBTRACT)
    with BuildSketch(Plane(origin=(-3.5, -36.903592415, 3), x_dir=(1, 0, 0), z_dir=(0, 1, 0))) as fillet1_2_piece_21:
        with BuildLine():
            CenterArc((1 + FILLET1_R, FILLET1_R), FILLET1_R, 180, 90)
            Line((1 + FILLET1_R, 0), (1, 0))
            Line((1, 0), (1, FILLET1_R))
        make_face()
    revolve(axis=Axis((-3.5, -36.903592415, 3), (0, 0, -1)), revolution_arc=26.26, mode=Mode.SUBTRACT)


solid = part.part
